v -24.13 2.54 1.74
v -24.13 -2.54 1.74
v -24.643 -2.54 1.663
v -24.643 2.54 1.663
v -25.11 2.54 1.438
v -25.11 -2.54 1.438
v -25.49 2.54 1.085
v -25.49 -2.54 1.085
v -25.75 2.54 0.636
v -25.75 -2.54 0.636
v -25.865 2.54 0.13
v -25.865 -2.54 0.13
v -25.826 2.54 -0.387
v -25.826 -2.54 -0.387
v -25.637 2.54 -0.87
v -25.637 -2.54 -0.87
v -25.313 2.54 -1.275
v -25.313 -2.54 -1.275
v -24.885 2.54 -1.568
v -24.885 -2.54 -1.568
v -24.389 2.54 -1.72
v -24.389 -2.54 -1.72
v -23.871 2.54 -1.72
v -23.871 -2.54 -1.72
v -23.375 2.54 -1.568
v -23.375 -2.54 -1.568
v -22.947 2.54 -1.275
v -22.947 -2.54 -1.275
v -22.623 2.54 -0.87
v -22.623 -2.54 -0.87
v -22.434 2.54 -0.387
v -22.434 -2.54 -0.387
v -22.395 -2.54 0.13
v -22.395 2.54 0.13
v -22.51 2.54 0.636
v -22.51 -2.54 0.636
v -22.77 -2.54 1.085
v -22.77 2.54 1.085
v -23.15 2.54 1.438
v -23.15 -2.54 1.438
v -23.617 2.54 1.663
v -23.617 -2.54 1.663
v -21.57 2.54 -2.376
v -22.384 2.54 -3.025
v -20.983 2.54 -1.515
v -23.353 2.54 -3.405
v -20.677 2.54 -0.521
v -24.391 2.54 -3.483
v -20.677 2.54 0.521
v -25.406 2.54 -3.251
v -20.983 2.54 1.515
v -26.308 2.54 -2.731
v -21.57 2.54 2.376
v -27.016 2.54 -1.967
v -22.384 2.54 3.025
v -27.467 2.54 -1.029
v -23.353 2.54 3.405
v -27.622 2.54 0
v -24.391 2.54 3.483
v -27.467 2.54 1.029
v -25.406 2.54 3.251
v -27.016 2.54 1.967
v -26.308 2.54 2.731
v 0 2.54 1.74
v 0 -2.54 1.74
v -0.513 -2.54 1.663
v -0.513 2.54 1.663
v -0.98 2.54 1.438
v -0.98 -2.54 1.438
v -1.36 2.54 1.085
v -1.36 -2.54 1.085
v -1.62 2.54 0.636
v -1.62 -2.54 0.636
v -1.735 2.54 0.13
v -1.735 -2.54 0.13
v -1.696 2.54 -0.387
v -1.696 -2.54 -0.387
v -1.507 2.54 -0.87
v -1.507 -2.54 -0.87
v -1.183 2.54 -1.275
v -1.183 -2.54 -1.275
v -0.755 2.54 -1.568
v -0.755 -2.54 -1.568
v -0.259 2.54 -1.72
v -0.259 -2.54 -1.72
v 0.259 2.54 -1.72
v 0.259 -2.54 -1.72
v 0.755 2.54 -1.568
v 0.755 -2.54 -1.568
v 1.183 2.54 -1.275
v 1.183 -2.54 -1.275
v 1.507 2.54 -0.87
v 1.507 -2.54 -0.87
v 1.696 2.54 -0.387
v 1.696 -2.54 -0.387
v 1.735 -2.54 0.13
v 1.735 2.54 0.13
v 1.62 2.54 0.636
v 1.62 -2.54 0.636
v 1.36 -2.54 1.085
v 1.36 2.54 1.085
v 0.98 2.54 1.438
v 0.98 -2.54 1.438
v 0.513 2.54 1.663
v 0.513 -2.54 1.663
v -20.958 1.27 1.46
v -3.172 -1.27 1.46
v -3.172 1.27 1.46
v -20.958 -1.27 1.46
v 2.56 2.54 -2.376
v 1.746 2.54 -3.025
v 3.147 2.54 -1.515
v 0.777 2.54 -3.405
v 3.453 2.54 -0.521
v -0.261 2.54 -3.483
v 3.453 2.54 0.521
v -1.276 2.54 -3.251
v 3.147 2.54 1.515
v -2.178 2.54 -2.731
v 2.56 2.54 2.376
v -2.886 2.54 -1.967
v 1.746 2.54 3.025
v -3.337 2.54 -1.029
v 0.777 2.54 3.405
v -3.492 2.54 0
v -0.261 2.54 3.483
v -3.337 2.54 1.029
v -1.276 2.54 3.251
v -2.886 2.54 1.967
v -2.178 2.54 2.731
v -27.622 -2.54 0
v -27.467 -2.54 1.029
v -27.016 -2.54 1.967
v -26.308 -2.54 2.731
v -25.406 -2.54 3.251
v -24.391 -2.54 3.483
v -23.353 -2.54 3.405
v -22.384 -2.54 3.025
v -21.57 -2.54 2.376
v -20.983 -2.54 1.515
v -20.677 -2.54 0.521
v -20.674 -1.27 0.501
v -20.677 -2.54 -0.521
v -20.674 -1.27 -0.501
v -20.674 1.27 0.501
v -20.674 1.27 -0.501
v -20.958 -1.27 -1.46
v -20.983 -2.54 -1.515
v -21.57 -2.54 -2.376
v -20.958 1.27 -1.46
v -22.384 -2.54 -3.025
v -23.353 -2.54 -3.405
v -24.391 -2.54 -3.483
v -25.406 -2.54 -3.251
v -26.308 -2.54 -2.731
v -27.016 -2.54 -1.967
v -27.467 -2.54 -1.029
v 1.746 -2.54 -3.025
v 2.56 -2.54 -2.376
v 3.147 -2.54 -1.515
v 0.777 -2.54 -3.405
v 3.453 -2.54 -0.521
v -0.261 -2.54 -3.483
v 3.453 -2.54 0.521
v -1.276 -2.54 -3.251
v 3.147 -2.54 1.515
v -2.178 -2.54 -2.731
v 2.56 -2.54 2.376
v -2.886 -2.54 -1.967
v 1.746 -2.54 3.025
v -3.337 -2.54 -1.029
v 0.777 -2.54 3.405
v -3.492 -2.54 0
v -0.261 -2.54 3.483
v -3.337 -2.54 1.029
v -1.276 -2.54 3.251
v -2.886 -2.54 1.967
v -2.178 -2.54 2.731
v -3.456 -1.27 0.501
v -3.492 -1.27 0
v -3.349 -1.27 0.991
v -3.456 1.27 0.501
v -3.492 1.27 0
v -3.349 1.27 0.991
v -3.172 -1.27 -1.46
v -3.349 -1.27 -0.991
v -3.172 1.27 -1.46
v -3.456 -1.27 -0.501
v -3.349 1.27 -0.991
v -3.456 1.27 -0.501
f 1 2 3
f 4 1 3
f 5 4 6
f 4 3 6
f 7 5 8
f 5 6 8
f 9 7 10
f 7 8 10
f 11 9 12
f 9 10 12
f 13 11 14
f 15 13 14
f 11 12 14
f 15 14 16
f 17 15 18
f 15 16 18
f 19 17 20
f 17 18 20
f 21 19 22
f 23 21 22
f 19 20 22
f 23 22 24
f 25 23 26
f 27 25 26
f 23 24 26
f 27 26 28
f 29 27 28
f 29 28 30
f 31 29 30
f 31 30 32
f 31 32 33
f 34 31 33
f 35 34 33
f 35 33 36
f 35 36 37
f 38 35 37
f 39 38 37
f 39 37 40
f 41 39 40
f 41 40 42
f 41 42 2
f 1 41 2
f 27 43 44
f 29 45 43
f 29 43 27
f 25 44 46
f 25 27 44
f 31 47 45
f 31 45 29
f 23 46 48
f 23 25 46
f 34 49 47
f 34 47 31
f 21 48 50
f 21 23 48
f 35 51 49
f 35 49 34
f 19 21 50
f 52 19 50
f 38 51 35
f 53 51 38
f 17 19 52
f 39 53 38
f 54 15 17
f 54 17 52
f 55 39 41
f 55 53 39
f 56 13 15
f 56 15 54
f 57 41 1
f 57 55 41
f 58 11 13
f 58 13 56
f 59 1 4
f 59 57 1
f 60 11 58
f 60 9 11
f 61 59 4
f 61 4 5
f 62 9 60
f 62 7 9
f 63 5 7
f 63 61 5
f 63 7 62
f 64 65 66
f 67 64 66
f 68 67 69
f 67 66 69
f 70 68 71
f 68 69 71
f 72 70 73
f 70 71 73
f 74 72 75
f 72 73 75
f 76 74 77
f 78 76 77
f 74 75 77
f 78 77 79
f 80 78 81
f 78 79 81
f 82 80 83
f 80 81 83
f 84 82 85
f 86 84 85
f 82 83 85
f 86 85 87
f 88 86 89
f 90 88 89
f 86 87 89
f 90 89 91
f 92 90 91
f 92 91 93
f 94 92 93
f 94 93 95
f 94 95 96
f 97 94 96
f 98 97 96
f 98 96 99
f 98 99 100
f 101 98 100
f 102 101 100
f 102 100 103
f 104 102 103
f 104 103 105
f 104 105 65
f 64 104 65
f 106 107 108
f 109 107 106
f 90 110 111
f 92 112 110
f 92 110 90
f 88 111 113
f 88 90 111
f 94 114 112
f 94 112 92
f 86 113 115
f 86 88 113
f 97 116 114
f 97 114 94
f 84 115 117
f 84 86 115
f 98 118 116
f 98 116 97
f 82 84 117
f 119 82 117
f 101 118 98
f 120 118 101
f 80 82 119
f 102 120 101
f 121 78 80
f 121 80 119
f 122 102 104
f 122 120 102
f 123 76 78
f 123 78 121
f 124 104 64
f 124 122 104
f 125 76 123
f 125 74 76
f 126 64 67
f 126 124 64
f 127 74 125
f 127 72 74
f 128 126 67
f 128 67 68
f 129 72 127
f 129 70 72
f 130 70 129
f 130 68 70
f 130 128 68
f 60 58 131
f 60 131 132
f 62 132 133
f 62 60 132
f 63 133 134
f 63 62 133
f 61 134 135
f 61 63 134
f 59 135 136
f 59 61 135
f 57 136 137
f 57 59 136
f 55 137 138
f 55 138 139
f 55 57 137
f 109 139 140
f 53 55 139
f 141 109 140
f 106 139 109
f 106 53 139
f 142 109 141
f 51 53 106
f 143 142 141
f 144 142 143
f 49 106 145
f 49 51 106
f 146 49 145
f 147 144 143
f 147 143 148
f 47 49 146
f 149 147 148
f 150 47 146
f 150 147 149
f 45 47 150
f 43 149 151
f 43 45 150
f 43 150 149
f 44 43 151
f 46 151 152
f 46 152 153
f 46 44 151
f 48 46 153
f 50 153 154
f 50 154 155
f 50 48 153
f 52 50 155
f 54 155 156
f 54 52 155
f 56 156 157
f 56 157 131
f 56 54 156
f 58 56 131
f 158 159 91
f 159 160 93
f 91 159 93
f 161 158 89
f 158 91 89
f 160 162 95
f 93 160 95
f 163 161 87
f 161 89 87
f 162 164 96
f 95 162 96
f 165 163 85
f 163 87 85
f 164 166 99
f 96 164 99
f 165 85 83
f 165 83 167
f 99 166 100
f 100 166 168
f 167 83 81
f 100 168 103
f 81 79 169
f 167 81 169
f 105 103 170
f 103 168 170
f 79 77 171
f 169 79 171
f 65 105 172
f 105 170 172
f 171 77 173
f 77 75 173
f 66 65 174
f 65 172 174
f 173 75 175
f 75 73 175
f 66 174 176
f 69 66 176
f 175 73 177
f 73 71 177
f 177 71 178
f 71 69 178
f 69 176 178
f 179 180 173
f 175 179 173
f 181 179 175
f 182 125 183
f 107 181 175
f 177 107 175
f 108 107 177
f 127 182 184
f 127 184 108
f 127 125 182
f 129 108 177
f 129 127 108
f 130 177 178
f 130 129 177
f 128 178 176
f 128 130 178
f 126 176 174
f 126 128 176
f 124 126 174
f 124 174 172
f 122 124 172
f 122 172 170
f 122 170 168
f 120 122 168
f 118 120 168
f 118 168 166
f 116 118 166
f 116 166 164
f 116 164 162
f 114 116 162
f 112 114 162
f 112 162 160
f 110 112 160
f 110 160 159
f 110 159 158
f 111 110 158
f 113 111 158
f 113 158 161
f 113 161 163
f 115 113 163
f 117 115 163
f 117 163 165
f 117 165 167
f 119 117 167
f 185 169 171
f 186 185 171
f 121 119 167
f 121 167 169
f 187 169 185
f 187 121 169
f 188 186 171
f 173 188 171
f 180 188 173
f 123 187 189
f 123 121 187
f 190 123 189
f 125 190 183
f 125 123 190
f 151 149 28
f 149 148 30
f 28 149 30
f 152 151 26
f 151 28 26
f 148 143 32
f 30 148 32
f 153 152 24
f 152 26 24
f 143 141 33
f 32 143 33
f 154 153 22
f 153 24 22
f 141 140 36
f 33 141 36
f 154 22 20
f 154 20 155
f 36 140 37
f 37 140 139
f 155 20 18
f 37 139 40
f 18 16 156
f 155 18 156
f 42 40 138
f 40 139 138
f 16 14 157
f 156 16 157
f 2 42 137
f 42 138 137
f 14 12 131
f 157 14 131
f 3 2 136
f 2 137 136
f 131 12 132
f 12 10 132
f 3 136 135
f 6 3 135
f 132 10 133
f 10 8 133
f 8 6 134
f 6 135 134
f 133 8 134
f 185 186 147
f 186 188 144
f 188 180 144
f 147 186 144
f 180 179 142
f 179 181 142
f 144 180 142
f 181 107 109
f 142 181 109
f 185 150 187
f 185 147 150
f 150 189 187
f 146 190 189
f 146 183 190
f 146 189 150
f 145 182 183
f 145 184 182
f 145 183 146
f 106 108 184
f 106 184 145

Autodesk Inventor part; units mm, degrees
ref_plane "YZ Plane" through (0, 0, 0) normal (1, 0, 0) x (0, 1, 0)
ref_plane "XZ Plane" through (0, 0, 0) normal (0, 1, 0) x (-1, 0, 0)
ref_plane "XY Plane" through (0, 0, 0) normal (0, 0, 1) x (1, 0, 0)
sketch "Sketch1" plane through (0, 0, 0) normal (0, 1, 0) x (-1, 0, 0)
  circle A0 centre (0, 0) radius 3.4925
  circle A1 centre (24.13, 0) radius 3.4925
  line L0 (0, 1.4605) -> (24.13, 1.4605)
  line L1 (24.13, 1.4605) -> (24.13, -1.4605)
  line L2 (24.13, -1.4605) -> (0, -1.4605)
  line L3 (0, -1.4605) -> (0, 1.4605)
  dimension "d0" = 6.985
  dimension "d1" = 2.921
  dimension "d2" = 1.4605
  dimension "d3" = 24.13
  dimension "d4" = 6.985
extrude "Extrusion1" add sketch "Sketch1" along normal mid plane 5.08 contours A0 L2 L3 L0 | L0 L3 L2 A0 | L0 L1 L2 A1 | A1 L2 L1 L0
sketch "Sketch2" plane through (0, 0, 0) normal (0, 1, 0) x (-1, 0, 0)
  circle A0 centre (0, 0) radius 3.4925
  circle A1 centre (24.13, 0) radius 3.4925
  line L0 (0, 1.4605) -> (24.13, 1.4605)
  line L1 (24.13, 1.4605) -> (24.13, -1.4605)
  line L2 (24.13, -1.4605) -> (0, -1.4605)
  line L3 (0, -1.4605) -> (0, 1.4605)
  dimension "d7" = 6.985
  dimension "d8" = 2.921
  dimension "d9" = 1.4605
  dimension "d10" = 24.13
  dimension "d11" = 6.985
extrude "Extrusion2" add sketch "Sketch2" along normal mid plane 2.54 contours A0 L2 L3 L0 | A0 L0 A1 L2 | L0 L1 L2 A1 picked at (1.1642, 0) picked at (22.9658, 0)
hole "Hole1" at (-24.13, 2.54, 0) direction (0, -1, 0) diameter 3.4798 end through all
hole "Hole3" at (0, 2.54, 0) direction (0, -1, 0) diameter 3.4798 end through all
equation "\"d0\" = d4"
equation "\"d2\" = 0.5 * d1"
equation "\"d7\" = d11"
equation "\"d9\" = 0.5 * d8"
properties part number "Crankarm"
